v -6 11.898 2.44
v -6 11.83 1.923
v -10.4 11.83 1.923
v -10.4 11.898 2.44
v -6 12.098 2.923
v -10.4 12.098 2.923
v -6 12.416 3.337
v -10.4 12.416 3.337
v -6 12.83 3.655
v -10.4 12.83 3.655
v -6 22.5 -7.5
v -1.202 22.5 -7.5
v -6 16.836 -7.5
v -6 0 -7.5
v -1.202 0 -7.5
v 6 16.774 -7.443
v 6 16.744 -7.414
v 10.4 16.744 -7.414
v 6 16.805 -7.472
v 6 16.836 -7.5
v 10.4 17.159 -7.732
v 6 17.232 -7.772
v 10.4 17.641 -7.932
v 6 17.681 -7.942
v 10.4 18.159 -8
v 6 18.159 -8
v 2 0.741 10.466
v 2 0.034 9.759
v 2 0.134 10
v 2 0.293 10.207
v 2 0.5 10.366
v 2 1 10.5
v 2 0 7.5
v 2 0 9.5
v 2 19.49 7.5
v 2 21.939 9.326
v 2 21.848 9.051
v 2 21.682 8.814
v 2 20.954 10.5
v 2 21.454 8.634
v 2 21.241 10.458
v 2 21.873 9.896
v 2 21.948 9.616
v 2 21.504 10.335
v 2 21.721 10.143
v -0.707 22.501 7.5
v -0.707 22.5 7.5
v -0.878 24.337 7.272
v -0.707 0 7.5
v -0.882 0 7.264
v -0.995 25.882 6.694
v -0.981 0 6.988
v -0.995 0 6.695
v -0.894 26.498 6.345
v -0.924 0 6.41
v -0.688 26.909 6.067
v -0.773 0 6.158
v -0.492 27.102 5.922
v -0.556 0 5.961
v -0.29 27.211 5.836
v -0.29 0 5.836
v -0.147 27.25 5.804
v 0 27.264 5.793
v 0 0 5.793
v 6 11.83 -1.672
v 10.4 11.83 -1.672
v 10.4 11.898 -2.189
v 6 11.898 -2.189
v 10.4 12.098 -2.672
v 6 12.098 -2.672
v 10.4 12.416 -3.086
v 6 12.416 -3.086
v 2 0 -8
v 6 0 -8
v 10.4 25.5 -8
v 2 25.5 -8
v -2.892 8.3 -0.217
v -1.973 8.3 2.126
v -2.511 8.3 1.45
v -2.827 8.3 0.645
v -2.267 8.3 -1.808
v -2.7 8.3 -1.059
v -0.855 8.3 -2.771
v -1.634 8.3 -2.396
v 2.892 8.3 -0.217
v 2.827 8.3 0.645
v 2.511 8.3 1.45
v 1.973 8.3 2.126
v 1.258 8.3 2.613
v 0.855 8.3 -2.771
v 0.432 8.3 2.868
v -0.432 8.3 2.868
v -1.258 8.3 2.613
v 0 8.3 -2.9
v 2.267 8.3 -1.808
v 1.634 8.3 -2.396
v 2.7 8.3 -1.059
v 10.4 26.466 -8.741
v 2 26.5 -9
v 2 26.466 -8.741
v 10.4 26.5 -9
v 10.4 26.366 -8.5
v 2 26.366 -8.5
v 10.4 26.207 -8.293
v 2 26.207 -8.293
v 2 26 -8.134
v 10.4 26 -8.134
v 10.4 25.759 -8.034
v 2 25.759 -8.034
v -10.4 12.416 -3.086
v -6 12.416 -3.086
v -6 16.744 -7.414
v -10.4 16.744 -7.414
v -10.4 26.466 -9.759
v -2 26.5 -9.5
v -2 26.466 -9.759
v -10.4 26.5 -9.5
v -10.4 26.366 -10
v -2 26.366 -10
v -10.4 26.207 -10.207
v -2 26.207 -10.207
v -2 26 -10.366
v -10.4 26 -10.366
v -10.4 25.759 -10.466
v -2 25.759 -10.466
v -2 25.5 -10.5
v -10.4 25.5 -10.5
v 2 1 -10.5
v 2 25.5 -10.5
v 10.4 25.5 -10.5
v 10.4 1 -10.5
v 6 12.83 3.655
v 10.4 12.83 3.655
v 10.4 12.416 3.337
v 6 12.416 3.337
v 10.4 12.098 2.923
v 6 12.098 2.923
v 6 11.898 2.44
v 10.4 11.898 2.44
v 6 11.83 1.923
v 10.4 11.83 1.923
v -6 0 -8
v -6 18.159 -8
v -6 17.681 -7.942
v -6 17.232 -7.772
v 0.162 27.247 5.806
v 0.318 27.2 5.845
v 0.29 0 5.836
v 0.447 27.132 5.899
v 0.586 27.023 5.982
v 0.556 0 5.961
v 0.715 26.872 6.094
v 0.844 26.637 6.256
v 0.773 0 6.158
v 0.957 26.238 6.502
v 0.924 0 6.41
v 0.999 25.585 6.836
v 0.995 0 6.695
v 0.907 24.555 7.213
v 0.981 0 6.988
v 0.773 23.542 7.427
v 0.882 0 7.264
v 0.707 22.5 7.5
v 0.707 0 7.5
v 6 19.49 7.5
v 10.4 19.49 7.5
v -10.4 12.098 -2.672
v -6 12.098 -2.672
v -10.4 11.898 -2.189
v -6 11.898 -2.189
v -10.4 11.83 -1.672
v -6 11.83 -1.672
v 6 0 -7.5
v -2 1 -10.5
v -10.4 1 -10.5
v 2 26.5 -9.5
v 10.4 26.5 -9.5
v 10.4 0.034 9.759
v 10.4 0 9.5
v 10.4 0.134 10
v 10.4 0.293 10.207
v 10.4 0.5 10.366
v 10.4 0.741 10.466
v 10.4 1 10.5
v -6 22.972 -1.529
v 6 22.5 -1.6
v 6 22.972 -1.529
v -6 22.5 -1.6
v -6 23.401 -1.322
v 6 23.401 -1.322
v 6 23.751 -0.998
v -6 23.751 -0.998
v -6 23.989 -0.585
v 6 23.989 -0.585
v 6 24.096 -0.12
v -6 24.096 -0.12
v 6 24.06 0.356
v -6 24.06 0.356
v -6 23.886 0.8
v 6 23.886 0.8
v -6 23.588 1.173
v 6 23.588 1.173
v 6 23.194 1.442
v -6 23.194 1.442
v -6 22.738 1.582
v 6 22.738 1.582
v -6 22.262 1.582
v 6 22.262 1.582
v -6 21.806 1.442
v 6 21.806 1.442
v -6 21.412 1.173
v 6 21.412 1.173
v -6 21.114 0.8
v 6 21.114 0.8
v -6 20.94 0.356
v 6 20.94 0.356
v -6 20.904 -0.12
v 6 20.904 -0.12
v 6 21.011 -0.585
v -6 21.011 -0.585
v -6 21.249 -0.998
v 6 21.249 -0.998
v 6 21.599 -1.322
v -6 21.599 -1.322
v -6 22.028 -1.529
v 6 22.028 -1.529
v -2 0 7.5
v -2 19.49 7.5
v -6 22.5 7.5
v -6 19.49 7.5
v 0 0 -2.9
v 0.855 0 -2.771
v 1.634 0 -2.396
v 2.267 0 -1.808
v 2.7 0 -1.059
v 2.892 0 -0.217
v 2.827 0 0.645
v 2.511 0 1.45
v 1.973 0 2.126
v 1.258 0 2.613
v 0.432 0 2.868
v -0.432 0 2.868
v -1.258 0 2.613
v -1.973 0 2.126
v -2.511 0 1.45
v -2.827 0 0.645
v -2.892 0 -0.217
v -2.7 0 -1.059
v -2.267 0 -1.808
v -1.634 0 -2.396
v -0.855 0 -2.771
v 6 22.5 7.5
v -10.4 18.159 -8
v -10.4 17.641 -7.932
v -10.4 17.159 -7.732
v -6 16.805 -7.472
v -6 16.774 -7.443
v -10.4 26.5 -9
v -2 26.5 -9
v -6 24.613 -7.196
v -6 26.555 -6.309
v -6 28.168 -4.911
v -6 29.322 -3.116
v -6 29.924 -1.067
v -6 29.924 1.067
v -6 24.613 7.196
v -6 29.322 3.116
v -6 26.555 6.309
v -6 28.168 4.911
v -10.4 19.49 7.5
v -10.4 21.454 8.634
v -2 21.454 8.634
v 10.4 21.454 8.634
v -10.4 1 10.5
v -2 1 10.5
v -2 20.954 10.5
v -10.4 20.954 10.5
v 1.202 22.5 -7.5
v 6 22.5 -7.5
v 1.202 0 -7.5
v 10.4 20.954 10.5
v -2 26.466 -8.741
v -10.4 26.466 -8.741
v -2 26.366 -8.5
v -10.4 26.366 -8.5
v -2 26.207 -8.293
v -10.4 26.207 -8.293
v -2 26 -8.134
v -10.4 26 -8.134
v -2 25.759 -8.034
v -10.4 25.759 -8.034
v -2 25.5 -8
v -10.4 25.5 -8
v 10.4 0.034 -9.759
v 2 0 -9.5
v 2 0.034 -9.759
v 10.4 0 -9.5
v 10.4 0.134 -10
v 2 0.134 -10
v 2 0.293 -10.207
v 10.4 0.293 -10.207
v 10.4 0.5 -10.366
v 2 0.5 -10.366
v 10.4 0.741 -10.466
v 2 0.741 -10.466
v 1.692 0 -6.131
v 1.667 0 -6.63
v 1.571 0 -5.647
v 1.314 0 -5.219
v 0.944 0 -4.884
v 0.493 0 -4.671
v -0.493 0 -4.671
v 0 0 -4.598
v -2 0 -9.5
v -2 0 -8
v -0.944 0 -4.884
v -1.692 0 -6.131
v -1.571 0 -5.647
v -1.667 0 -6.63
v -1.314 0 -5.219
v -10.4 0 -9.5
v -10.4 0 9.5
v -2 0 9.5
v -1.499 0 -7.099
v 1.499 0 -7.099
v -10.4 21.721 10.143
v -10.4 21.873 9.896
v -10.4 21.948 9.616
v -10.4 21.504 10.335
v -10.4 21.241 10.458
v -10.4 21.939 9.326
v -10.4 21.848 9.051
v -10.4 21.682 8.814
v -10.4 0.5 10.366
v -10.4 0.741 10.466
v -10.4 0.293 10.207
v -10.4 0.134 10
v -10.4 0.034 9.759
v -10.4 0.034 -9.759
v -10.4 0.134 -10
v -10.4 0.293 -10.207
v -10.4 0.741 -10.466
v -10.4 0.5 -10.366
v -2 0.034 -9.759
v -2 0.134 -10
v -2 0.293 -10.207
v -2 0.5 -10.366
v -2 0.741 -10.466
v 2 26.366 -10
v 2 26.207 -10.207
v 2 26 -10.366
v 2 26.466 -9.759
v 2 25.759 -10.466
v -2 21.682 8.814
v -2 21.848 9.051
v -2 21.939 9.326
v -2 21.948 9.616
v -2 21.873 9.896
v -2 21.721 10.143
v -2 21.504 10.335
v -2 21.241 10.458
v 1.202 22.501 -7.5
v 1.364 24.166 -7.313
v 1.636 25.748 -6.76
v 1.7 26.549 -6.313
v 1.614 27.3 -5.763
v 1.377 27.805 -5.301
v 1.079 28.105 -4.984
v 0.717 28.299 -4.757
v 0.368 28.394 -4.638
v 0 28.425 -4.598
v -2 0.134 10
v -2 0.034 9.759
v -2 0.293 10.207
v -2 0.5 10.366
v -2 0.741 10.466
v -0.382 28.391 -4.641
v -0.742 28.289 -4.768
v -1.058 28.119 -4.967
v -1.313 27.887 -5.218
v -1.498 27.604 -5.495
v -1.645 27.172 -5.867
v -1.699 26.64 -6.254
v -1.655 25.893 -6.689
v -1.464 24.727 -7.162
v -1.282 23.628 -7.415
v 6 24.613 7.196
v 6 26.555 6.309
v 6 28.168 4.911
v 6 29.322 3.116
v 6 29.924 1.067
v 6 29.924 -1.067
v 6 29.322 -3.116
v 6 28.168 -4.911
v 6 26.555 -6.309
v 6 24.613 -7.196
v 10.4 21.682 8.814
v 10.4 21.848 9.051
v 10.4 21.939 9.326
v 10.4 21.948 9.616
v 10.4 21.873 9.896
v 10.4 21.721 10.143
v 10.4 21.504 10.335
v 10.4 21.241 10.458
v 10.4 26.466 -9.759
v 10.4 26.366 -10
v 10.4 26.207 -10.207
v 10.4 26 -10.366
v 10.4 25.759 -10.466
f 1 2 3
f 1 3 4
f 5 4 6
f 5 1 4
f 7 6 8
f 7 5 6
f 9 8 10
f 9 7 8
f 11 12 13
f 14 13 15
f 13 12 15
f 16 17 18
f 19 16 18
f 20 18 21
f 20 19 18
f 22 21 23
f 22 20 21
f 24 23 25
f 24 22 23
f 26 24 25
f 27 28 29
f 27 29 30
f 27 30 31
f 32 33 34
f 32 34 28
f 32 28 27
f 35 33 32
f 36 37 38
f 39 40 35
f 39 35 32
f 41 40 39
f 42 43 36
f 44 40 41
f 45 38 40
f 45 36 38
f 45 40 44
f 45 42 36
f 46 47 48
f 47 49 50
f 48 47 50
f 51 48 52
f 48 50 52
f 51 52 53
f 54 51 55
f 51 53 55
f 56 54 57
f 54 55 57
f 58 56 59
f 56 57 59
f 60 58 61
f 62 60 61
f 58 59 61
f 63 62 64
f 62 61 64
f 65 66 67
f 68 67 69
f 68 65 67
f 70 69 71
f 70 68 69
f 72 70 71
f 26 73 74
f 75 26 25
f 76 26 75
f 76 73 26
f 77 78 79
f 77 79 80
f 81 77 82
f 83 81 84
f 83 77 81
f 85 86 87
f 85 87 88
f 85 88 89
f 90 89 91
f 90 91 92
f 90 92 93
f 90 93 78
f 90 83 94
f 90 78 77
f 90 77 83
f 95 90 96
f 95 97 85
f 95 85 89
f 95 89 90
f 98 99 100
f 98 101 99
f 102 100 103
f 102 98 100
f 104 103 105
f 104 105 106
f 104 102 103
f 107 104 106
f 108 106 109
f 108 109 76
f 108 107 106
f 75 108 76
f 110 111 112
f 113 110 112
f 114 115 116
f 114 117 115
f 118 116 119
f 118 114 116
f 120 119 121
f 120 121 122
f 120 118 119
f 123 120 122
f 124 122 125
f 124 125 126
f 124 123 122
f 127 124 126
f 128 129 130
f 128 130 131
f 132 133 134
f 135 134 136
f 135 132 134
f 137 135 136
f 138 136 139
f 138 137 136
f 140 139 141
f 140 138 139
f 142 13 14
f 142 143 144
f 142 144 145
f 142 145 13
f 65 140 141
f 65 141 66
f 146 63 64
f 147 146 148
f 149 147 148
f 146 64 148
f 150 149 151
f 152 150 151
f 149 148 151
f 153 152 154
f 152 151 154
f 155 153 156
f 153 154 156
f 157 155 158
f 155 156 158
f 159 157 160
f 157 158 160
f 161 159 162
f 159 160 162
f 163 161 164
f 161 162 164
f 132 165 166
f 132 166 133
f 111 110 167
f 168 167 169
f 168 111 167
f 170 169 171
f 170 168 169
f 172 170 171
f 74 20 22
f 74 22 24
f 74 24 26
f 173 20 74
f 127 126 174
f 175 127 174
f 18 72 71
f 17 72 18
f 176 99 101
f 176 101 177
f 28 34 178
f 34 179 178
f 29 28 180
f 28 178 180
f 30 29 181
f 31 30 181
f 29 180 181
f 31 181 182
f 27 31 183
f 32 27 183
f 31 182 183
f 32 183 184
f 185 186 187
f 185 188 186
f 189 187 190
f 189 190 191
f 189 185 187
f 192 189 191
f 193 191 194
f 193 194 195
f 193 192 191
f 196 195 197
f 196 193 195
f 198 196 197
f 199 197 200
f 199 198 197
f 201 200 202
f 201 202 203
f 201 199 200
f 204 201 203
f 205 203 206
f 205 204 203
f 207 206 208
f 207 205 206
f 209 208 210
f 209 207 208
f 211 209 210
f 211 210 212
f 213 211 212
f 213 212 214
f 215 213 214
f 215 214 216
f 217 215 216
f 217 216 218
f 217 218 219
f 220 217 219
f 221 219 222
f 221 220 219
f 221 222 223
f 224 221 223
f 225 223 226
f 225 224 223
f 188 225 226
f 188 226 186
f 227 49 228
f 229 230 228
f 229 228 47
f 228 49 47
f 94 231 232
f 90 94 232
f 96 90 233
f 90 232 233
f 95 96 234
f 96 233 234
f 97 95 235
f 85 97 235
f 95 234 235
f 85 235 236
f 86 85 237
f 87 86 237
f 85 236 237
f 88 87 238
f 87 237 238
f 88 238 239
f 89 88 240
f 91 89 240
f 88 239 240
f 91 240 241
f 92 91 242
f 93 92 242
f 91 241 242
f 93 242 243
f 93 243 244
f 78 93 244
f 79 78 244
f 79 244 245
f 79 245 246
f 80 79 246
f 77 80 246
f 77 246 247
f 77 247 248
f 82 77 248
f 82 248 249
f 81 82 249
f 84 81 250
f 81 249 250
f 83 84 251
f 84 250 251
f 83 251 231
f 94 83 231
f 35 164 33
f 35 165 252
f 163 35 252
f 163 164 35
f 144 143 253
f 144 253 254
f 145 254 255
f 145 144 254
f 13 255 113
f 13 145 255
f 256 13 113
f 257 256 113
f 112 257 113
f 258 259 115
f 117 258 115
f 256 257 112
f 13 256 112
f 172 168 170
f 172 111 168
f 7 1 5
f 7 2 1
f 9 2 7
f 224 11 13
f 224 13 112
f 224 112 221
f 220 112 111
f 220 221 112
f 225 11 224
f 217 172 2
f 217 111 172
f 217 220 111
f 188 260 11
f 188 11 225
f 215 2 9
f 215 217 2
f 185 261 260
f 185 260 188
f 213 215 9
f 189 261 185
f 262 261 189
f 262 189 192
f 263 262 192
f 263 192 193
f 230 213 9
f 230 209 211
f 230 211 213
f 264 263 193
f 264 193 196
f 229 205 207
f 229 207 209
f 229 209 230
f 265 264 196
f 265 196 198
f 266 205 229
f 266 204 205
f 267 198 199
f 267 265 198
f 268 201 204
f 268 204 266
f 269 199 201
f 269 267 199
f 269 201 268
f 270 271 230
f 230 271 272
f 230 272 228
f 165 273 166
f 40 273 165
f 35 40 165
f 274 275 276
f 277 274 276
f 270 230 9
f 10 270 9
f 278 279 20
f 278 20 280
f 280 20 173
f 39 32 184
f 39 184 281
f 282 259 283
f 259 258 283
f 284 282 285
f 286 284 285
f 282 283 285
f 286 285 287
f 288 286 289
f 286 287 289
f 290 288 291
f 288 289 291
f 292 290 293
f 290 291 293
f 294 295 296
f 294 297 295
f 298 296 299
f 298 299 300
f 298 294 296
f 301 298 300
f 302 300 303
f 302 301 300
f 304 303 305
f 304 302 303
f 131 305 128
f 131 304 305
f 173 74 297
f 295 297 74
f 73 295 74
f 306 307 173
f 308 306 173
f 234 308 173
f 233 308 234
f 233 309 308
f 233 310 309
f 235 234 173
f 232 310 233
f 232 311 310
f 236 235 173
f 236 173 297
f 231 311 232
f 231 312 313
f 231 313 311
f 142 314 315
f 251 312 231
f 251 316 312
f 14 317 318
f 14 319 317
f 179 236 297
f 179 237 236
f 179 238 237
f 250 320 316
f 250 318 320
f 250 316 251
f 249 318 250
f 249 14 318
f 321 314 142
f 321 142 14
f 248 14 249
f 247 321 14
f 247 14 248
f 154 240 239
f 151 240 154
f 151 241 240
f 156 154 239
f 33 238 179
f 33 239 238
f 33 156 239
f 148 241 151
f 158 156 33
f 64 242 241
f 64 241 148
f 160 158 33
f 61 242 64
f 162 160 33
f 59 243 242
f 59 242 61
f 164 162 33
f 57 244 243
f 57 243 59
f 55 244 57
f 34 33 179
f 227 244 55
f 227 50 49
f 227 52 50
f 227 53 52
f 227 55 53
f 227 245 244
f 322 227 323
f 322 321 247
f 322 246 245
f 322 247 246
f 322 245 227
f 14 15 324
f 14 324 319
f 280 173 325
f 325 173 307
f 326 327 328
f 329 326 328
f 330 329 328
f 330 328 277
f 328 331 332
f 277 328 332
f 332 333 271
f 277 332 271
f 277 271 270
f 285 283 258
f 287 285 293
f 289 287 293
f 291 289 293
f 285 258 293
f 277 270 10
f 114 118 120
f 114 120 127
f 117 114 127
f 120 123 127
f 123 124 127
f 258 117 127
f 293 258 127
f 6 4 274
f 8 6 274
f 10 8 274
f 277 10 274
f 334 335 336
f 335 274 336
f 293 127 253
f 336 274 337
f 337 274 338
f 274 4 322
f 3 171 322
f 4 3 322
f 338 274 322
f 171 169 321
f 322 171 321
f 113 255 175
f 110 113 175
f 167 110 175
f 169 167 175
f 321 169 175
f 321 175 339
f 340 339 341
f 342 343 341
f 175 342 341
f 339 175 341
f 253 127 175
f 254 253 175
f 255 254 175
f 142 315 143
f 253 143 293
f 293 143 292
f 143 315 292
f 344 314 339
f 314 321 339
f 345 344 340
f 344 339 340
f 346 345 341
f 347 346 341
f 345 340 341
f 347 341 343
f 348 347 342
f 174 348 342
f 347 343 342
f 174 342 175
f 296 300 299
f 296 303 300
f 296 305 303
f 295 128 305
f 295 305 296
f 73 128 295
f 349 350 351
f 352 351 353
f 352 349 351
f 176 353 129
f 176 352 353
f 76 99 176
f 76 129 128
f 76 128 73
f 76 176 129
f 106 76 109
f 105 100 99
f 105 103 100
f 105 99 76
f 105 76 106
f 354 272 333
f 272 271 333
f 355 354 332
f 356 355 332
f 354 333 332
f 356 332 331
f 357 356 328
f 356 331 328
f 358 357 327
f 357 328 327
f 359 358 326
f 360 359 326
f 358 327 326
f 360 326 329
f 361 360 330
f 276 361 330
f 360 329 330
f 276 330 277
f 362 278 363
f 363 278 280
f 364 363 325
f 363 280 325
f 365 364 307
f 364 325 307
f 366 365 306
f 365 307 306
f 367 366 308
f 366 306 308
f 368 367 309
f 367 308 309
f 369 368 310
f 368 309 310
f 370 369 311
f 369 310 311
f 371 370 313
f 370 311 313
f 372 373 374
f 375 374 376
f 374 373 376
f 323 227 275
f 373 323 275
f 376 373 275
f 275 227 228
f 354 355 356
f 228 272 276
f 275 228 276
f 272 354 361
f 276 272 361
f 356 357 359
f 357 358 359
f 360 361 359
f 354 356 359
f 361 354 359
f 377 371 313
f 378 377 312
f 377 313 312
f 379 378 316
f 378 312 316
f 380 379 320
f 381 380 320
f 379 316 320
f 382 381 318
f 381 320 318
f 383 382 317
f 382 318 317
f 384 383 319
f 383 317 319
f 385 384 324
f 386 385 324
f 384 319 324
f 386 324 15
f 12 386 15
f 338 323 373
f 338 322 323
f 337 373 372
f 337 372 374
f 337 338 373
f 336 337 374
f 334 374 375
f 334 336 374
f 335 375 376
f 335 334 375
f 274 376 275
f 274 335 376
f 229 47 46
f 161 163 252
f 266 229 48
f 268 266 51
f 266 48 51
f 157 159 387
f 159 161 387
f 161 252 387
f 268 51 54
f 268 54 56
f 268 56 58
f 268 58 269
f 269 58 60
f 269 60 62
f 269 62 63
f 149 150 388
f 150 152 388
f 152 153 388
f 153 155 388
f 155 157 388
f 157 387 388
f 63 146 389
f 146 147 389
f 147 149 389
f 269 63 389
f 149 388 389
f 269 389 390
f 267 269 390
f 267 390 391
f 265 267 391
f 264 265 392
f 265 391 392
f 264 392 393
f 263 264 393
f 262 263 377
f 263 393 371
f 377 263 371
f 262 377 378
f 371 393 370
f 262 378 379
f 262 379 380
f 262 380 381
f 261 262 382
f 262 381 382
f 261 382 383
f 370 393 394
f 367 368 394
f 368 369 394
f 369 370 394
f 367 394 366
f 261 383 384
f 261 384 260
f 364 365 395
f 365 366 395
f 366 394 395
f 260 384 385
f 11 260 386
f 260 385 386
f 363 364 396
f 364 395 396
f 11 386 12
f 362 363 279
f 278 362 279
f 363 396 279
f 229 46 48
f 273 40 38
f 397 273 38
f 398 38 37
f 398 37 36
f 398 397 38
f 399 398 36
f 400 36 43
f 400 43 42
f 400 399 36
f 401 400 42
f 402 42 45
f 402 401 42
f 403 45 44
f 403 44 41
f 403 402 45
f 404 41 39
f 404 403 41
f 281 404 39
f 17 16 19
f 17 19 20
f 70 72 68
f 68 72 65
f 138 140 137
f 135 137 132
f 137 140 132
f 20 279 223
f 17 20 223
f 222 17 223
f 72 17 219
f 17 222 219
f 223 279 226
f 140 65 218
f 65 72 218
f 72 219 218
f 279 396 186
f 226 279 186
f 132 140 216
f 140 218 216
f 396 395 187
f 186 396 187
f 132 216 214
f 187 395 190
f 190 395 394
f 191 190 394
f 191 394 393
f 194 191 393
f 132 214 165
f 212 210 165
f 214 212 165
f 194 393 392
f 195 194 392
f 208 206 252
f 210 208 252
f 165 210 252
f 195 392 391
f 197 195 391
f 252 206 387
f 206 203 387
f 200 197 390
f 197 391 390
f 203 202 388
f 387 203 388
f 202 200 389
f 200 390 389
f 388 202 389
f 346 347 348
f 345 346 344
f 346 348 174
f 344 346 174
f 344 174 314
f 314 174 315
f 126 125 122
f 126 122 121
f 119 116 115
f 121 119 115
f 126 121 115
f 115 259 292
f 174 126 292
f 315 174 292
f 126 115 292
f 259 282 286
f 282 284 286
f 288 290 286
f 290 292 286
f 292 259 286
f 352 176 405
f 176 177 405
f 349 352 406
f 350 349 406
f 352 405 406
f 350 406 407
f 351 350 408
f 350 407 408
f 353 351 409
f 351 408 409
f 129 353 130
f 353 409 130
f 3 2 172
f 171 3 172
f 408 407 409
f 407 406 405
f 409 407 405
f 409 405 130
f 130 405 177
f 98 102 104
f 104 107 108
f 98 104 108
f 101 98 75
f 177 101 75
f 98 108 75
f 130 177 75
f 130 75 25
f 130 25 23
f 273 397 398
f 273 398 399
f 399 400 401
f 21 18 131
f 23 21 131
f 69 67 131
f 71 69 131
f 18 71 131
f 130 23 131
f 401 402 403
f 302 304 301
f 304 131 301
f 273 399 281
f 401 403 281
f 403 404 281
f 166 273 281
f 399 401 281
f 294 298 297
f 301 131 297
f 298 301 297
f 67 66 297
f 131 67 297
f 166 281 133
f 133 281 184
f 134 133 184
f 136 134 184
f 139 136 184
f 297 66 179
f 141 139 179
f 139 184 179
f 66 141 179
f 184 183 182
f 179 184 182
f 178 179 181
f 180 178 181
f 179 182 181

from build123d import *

# Parameters (mm, degrees)
SKETCH1_R                    = 1.6
BASE_DEPTH                   = 6
PTFE_CLAMP_3MM_OD_DEPTH      = 32.5
PTFE_CLAMP_1_6MM_OD_DEPTH    = 32.500000138
SKETCH3_R                    = 2.9
RUTHEX_M3_INSERT_HOLE_DEPTH  = 8.3
SIDE_PROFILE_DEPTH           = 4.4
ANGLE_CONSTRAINT_BACK_START  = -4
ANGLE_CONSTRAINT_BACK_DEPTH  = 8.4
ANGLE_CONSTRAINT_FRONT_START = -4
ANGLE_CONSTRAINT_FRONT_DEPTH = 8.4
FILLET4_R                    = 1
FILLET5_R                    = 2
FILLET4_OF_MIRROR4_R         = 1
FILLET5_OF_MIRROR4_R         = 2


with BuildPart() as part:
    # Sketch1 → base (new, symmetric)
    with BuildSketch(Plane(origin=(0, 0, 0), x_dir=(0, 0, -1), z_dir=(1, 0, 0))):
        with BuildLine():
            Line((7.5, 0), (-7.5, 0))
            Line((-7.5, 0), (-7.5, 22.5))
            ThreePointArc((-7.5, 22.5), (0, 30), (7.5, 22.5))
            Line((7.5, 22.5), (7.5, 0))
        make_face()
        with Locations((0, 22.5)):
            Circle(SKETCH1_R, mode=Mode.SUBTRACT)
    extrude(amount=BASE_DEPTH, both=True)

    # Sketch2 → PTFE_clamp_3mm_OD (cut, through all)
    with BuildSketch(Plane.XZ):
        with BuildLine():
            Line((0, -7.5), (1.202081528, -7.5))
            ThreePointArc((1.202081528, -7.5), (1.570595205, -5.647356637), (0, -4.597918472))
            Line((0, -4.597918472), (0, -7.5))
        make_face()
        with BuildLine():
            Line((-1.202081528, -7.5), (0, -7.5))
            Line((0, -7.5), (0, -4.597918472))
            ThreePointArc((0, -4.597918472), (-1.570595205, -5.647356637), (-1.202081528, -7.5))
        make_face()
        with BuildLine():
            Line((0, -7.5), (1.202081528, -7.5))
            ThreePointArc((1.202081528, -7.5), (1.570595205, -5.647356637), (0, -4.597918472))
            Line((0, -4.597918472), (0, -7.5))
        make_face()
        with BuildLine():
            Line((-1.202081528, -7.5), (0, -7.5))
            Line((0, -7.5), (0, -4.597918472))
            ThreePointArc((0, -4.597918472), (-1.570595205, -5.647356637), (-1.202081528, -7.5))
        make_face()
    extrude(amount=-PTFE_CLAMP_3MM_OD_DEPTH, mode=Mode.SUBTRACT)

    # Sketch2<3> → PTFE_clamp_1.6mm_OD (cut, through all)
    with BuildSketch(Plane.XZ):
        with BuildLine():
            ThreePointArc((-0.707106781, 7.5), (-0.923879533, 6.410209786), (0, 5.792893219))
            Line((0, 5.792893219), (0, 7.5))
            Line((0, 7.5), (-0.707106781, 7.5))
        make_face()
        with BuildLine():
            Line((0, 7.5), (0, 5.792893219))
            ThreePointArc((0, 5.792893219), (0.923879533, 6.410209786), (0.707106781, 7.5))
            Line((0.707106781, 7.5), (0, 7.5))
        make_face()
        with BuildLine():
            ThreePointArc((-0.707106781, 7.5), (-0.923879533, 6.410209786), (0, 5.792893219))
            Line((0, 5.792893219), (0, 7.5))
            Line((0, 7.5), (-0.707106781, 7.5))
        make_face()
        with BuildLine():
            Line((0, 7.5), (0, 5.792893219))
            ThreePointArc((0, 5.792893219), (0.923879533, 6.410209786), (0.707106781, 7.5))
            Line((0.707106781, 7.5), (0, 7.5))
        make_face()
    extrude(amount=-PTFE_CLAMP_1_6MM_OD_DEPTH, mode=Mode.SUBTRACT)

    # Sketch3 → ruthex_m3_insert_hole (cut)
    with BuildSketch(Plane.XZ):
        with Locations(Location((0, 0, 0), (0, 0, 270))):
            Circle(SKETCH3_R)
    extrude(amount=-RUTHEX_M3_INSERT_HOLE_DEPTH, mode=Mode.SUBTRACT)

    # Sketch4 → side_profile (add)
    with BuildSketch(Plane.ZY.offset(6)):
        Polygon((-8, 0), (7.5, 0), (7.5, 19.490381057), (3.077350269, 11.830127019), (-2.5, 11.830127019), (-8, 17.330127019), align=None)
    side_profile = extrude(amount=SIDE_PROFILE_DEPTH)

    # Sketch4<4> → angle_constraint_back (add)
    with BuildSketch(Plane.ZY.offset(6).offset(ANGLE_CONSTRAINT_BACK_START)):
        Polygon((-10.5, 0), (-8, 0), (-8, 17.330127019), (-8, 26.5), (-10.5, 26.5), align=None)
    angle_constraint_back = extrude(amount=ANGLE_CONSTRAINT_BACK_DEPTH)

    # Sketch4<6> → angle_constraint_front (add)
    with BuildSketch(Plane.ZY.offset(6).offset(ANGLE_CONSTRAINT_FRONT_START)):
        Polygon((7.5, 19.490381057), (7.5, 0), (10.5, 0), (10.5, 24.686533479), align=None)
    angle_constraint_front = extrude(amount=ANGLE_CONSTRAINT_FRONT_DEPTH)

    # Fillet4
    fillet4_edges = [part.edges().sort_by_distance(p)[0] for p in [
        (-6.2, 26.5, -8),
        (-6.2, 0, -10.5),
        (-6.2, 26.5, -10.5),
        (-6.2, 24.686533479, 10.5),
        (-6.2, 0, 10.5),
    ]]
    fillet(fillet4_edges, radius=FILLET4_R)

    # Fillet5
    # the kernel refuses this fillet: 2 mm, written as the material it adds along each edge
    with BuildSketch(Plane(origin=(-3.113248654, 11.830127019, 3.077350269), x_dir=(0, 0.8660254037844377, 0.5000000000000013), z_dir=(-1, 0, 0))) as fillet5_piece_1:
        with BuildLine():
            CenterArc((FILLET5_R * 0.57735026919, FILLET5_R), FILLET5_R, 210, 60)
            Line((-FILLET5_R * 0.288675134595, FILLET5_R * 0.5), (0, 0))
            Line((0, 0), (FILLET5_R * 0.57735026919, 0))
        make_face()
    extrude(amount=7.286751346)
    with BuildSketch(Plane(origin=(-3.928932188, 11.830127019, -2.5), x_dir=(0, 0.7071067811865489, -0.7071067811865462), z_dir=(-1, 0, 0))) as fillet5_piece_2:
        with BuildLine():
            CenterArc((FILLET5_R * 0.414213562373, -FILLET5_R), FILLET5_R, 90, 45)
            Line((-FILLET5_R * 0.292893218813, -FILLET5_R * 0.292893218813), (0, 0))
            Line((0, 0), (FILLET5_R * 0.414213562373, 0))
        make_face()
    extrude(amount=6.471067812)
    with BuildSketch(Plane(origin=(-6, 17.330127019, -8), x_dir=(0, 1, 0), z_dir=(-1, 0, 0))) as fillet5_piece_3:
        with BuildLine():
            CenterArc((FILLET5_R * 0.414213562373, -FILLET5_R), FILLET5_R, 90, 45)
            Line((-FILLET5_R * 0.292893218813, -FILLET5_R * 0.292893218813), (0, 0))
            Line((0, 0), (FILLET5_R * 0.414213562373, 0))
        make_face()
    extrude(amount=4.4)

    # Mirror4: side_profile, angle_constraint_back, angle_constraint_front across plane
    add(side_profile.mirror(Plane(origin=(0, 0, 0), x_dir=(0, 0, 1), z_dir=(1, 0, 0))))
    add(angle_constraint_back.mirror(Plane(origin=(0, 0, 0), x_dir=(0, 0, 1), z_dir=(1, 0, 0))))
    add(angle_constraint_front.mirror(Plane(origin=(0, 0, 0), x_dir=(0, 0, 1), z_dir=(1, 0, 0))))

    # Fillet4 of Mirror4
    fillet4_of_mirror4_edges = [part.edges().sort_by_distance(p)[0] for p in [
        (6.2, 26.5, -8),
        (6.2, 0, -10.5),
        (6.2, 26.5, -10.5),
        (6.2, 24.686533479, 10.5),
        (6.2, 0, 10.5),
    ]]
    fillet(fillet4_of_mirror4_edges, radius=FILLET4_OF_MIRROR4_R)

    # Fillet5 of Mirror4
    # the kernel refuses this fillet: 2 mm, written as the material it adds along each edge
    with BuildSketch(Plane(origin=(3.113248654, 11.830127019, 3.077350269), x_dir=(0, 0.8660254037844386, 0.5000000000000002), z_dir=(1, 0, 0))) as fillet5_of_mirror4_piece_1:
        with BuildLine():
            CenterArc((FILLET5_OF_MIRROR4_R * 0.57735026919, -FILLET5_OF_MIRROR4_R), FILLET5_OF_MIRROR4_R, 90, 60)
            Line((-FILLET5_OF_MIRROR4_R * 0.288675134595, -FILLET5_OF_MIRROR4_R * 0.5), (0, 0))
            Line((0, 0), (FILLET5_OF_MIRROR4_R * 0.57735026919, 0))
        make_face()
    extrude(amount=7.286751346)
    with BuildSketch(Plane(origin=(3.928932188, 11.830127019, -2.5), x_dir=(0, 0, 1), z_dir=(1, 0, 0))) as fillet5_of_mirror4_piece_2:
        with BuildLine():
            CenterArc((FILLET5_OF_MIRROR4_R * 0.414213562373, -FILLET5_OF_MIRROR4_R), FILLET5_OF_MIRROR4_R, 90, 45)
            Line((-FILLET5_OF_MIRROR4_R * 0.292893218813, -FILLET5_OF_MIRROR4_R * 0.292893218813), (0, 0))
            Line((0, 0), (FILLET5_OF_MIRROR4_R * 0.414213562373, 0))
        make_face()
    extrude(amount=6.471067812)
    with BuildSketch(Plane(origin=(6, 17.330127019, -8), x_dir=(0, 1, 0), z_dir=(1, 0, 0))) as fillet5_of_mirror4_piece_3:
        with BuildLine():
            CenterArc((FILLET5_OF_MIRROR4_R * 0.414213562373, FILLET5_OF_MIRROR4_R), FILLET5_OF_MIRROR4_R, 225, 45)
            Line((-FILLET5_OF_MIRROR4_R * 0.292893218813, FILLET5_OF_MIRROR4_R * 0.292893218813), (0, 0))
            Line((0, 0), (FILLET5_OF_MIRROR4_R * 0.414213562373, 0))
        make_face()
    extrude(amount=4.4)


solid = part.part
